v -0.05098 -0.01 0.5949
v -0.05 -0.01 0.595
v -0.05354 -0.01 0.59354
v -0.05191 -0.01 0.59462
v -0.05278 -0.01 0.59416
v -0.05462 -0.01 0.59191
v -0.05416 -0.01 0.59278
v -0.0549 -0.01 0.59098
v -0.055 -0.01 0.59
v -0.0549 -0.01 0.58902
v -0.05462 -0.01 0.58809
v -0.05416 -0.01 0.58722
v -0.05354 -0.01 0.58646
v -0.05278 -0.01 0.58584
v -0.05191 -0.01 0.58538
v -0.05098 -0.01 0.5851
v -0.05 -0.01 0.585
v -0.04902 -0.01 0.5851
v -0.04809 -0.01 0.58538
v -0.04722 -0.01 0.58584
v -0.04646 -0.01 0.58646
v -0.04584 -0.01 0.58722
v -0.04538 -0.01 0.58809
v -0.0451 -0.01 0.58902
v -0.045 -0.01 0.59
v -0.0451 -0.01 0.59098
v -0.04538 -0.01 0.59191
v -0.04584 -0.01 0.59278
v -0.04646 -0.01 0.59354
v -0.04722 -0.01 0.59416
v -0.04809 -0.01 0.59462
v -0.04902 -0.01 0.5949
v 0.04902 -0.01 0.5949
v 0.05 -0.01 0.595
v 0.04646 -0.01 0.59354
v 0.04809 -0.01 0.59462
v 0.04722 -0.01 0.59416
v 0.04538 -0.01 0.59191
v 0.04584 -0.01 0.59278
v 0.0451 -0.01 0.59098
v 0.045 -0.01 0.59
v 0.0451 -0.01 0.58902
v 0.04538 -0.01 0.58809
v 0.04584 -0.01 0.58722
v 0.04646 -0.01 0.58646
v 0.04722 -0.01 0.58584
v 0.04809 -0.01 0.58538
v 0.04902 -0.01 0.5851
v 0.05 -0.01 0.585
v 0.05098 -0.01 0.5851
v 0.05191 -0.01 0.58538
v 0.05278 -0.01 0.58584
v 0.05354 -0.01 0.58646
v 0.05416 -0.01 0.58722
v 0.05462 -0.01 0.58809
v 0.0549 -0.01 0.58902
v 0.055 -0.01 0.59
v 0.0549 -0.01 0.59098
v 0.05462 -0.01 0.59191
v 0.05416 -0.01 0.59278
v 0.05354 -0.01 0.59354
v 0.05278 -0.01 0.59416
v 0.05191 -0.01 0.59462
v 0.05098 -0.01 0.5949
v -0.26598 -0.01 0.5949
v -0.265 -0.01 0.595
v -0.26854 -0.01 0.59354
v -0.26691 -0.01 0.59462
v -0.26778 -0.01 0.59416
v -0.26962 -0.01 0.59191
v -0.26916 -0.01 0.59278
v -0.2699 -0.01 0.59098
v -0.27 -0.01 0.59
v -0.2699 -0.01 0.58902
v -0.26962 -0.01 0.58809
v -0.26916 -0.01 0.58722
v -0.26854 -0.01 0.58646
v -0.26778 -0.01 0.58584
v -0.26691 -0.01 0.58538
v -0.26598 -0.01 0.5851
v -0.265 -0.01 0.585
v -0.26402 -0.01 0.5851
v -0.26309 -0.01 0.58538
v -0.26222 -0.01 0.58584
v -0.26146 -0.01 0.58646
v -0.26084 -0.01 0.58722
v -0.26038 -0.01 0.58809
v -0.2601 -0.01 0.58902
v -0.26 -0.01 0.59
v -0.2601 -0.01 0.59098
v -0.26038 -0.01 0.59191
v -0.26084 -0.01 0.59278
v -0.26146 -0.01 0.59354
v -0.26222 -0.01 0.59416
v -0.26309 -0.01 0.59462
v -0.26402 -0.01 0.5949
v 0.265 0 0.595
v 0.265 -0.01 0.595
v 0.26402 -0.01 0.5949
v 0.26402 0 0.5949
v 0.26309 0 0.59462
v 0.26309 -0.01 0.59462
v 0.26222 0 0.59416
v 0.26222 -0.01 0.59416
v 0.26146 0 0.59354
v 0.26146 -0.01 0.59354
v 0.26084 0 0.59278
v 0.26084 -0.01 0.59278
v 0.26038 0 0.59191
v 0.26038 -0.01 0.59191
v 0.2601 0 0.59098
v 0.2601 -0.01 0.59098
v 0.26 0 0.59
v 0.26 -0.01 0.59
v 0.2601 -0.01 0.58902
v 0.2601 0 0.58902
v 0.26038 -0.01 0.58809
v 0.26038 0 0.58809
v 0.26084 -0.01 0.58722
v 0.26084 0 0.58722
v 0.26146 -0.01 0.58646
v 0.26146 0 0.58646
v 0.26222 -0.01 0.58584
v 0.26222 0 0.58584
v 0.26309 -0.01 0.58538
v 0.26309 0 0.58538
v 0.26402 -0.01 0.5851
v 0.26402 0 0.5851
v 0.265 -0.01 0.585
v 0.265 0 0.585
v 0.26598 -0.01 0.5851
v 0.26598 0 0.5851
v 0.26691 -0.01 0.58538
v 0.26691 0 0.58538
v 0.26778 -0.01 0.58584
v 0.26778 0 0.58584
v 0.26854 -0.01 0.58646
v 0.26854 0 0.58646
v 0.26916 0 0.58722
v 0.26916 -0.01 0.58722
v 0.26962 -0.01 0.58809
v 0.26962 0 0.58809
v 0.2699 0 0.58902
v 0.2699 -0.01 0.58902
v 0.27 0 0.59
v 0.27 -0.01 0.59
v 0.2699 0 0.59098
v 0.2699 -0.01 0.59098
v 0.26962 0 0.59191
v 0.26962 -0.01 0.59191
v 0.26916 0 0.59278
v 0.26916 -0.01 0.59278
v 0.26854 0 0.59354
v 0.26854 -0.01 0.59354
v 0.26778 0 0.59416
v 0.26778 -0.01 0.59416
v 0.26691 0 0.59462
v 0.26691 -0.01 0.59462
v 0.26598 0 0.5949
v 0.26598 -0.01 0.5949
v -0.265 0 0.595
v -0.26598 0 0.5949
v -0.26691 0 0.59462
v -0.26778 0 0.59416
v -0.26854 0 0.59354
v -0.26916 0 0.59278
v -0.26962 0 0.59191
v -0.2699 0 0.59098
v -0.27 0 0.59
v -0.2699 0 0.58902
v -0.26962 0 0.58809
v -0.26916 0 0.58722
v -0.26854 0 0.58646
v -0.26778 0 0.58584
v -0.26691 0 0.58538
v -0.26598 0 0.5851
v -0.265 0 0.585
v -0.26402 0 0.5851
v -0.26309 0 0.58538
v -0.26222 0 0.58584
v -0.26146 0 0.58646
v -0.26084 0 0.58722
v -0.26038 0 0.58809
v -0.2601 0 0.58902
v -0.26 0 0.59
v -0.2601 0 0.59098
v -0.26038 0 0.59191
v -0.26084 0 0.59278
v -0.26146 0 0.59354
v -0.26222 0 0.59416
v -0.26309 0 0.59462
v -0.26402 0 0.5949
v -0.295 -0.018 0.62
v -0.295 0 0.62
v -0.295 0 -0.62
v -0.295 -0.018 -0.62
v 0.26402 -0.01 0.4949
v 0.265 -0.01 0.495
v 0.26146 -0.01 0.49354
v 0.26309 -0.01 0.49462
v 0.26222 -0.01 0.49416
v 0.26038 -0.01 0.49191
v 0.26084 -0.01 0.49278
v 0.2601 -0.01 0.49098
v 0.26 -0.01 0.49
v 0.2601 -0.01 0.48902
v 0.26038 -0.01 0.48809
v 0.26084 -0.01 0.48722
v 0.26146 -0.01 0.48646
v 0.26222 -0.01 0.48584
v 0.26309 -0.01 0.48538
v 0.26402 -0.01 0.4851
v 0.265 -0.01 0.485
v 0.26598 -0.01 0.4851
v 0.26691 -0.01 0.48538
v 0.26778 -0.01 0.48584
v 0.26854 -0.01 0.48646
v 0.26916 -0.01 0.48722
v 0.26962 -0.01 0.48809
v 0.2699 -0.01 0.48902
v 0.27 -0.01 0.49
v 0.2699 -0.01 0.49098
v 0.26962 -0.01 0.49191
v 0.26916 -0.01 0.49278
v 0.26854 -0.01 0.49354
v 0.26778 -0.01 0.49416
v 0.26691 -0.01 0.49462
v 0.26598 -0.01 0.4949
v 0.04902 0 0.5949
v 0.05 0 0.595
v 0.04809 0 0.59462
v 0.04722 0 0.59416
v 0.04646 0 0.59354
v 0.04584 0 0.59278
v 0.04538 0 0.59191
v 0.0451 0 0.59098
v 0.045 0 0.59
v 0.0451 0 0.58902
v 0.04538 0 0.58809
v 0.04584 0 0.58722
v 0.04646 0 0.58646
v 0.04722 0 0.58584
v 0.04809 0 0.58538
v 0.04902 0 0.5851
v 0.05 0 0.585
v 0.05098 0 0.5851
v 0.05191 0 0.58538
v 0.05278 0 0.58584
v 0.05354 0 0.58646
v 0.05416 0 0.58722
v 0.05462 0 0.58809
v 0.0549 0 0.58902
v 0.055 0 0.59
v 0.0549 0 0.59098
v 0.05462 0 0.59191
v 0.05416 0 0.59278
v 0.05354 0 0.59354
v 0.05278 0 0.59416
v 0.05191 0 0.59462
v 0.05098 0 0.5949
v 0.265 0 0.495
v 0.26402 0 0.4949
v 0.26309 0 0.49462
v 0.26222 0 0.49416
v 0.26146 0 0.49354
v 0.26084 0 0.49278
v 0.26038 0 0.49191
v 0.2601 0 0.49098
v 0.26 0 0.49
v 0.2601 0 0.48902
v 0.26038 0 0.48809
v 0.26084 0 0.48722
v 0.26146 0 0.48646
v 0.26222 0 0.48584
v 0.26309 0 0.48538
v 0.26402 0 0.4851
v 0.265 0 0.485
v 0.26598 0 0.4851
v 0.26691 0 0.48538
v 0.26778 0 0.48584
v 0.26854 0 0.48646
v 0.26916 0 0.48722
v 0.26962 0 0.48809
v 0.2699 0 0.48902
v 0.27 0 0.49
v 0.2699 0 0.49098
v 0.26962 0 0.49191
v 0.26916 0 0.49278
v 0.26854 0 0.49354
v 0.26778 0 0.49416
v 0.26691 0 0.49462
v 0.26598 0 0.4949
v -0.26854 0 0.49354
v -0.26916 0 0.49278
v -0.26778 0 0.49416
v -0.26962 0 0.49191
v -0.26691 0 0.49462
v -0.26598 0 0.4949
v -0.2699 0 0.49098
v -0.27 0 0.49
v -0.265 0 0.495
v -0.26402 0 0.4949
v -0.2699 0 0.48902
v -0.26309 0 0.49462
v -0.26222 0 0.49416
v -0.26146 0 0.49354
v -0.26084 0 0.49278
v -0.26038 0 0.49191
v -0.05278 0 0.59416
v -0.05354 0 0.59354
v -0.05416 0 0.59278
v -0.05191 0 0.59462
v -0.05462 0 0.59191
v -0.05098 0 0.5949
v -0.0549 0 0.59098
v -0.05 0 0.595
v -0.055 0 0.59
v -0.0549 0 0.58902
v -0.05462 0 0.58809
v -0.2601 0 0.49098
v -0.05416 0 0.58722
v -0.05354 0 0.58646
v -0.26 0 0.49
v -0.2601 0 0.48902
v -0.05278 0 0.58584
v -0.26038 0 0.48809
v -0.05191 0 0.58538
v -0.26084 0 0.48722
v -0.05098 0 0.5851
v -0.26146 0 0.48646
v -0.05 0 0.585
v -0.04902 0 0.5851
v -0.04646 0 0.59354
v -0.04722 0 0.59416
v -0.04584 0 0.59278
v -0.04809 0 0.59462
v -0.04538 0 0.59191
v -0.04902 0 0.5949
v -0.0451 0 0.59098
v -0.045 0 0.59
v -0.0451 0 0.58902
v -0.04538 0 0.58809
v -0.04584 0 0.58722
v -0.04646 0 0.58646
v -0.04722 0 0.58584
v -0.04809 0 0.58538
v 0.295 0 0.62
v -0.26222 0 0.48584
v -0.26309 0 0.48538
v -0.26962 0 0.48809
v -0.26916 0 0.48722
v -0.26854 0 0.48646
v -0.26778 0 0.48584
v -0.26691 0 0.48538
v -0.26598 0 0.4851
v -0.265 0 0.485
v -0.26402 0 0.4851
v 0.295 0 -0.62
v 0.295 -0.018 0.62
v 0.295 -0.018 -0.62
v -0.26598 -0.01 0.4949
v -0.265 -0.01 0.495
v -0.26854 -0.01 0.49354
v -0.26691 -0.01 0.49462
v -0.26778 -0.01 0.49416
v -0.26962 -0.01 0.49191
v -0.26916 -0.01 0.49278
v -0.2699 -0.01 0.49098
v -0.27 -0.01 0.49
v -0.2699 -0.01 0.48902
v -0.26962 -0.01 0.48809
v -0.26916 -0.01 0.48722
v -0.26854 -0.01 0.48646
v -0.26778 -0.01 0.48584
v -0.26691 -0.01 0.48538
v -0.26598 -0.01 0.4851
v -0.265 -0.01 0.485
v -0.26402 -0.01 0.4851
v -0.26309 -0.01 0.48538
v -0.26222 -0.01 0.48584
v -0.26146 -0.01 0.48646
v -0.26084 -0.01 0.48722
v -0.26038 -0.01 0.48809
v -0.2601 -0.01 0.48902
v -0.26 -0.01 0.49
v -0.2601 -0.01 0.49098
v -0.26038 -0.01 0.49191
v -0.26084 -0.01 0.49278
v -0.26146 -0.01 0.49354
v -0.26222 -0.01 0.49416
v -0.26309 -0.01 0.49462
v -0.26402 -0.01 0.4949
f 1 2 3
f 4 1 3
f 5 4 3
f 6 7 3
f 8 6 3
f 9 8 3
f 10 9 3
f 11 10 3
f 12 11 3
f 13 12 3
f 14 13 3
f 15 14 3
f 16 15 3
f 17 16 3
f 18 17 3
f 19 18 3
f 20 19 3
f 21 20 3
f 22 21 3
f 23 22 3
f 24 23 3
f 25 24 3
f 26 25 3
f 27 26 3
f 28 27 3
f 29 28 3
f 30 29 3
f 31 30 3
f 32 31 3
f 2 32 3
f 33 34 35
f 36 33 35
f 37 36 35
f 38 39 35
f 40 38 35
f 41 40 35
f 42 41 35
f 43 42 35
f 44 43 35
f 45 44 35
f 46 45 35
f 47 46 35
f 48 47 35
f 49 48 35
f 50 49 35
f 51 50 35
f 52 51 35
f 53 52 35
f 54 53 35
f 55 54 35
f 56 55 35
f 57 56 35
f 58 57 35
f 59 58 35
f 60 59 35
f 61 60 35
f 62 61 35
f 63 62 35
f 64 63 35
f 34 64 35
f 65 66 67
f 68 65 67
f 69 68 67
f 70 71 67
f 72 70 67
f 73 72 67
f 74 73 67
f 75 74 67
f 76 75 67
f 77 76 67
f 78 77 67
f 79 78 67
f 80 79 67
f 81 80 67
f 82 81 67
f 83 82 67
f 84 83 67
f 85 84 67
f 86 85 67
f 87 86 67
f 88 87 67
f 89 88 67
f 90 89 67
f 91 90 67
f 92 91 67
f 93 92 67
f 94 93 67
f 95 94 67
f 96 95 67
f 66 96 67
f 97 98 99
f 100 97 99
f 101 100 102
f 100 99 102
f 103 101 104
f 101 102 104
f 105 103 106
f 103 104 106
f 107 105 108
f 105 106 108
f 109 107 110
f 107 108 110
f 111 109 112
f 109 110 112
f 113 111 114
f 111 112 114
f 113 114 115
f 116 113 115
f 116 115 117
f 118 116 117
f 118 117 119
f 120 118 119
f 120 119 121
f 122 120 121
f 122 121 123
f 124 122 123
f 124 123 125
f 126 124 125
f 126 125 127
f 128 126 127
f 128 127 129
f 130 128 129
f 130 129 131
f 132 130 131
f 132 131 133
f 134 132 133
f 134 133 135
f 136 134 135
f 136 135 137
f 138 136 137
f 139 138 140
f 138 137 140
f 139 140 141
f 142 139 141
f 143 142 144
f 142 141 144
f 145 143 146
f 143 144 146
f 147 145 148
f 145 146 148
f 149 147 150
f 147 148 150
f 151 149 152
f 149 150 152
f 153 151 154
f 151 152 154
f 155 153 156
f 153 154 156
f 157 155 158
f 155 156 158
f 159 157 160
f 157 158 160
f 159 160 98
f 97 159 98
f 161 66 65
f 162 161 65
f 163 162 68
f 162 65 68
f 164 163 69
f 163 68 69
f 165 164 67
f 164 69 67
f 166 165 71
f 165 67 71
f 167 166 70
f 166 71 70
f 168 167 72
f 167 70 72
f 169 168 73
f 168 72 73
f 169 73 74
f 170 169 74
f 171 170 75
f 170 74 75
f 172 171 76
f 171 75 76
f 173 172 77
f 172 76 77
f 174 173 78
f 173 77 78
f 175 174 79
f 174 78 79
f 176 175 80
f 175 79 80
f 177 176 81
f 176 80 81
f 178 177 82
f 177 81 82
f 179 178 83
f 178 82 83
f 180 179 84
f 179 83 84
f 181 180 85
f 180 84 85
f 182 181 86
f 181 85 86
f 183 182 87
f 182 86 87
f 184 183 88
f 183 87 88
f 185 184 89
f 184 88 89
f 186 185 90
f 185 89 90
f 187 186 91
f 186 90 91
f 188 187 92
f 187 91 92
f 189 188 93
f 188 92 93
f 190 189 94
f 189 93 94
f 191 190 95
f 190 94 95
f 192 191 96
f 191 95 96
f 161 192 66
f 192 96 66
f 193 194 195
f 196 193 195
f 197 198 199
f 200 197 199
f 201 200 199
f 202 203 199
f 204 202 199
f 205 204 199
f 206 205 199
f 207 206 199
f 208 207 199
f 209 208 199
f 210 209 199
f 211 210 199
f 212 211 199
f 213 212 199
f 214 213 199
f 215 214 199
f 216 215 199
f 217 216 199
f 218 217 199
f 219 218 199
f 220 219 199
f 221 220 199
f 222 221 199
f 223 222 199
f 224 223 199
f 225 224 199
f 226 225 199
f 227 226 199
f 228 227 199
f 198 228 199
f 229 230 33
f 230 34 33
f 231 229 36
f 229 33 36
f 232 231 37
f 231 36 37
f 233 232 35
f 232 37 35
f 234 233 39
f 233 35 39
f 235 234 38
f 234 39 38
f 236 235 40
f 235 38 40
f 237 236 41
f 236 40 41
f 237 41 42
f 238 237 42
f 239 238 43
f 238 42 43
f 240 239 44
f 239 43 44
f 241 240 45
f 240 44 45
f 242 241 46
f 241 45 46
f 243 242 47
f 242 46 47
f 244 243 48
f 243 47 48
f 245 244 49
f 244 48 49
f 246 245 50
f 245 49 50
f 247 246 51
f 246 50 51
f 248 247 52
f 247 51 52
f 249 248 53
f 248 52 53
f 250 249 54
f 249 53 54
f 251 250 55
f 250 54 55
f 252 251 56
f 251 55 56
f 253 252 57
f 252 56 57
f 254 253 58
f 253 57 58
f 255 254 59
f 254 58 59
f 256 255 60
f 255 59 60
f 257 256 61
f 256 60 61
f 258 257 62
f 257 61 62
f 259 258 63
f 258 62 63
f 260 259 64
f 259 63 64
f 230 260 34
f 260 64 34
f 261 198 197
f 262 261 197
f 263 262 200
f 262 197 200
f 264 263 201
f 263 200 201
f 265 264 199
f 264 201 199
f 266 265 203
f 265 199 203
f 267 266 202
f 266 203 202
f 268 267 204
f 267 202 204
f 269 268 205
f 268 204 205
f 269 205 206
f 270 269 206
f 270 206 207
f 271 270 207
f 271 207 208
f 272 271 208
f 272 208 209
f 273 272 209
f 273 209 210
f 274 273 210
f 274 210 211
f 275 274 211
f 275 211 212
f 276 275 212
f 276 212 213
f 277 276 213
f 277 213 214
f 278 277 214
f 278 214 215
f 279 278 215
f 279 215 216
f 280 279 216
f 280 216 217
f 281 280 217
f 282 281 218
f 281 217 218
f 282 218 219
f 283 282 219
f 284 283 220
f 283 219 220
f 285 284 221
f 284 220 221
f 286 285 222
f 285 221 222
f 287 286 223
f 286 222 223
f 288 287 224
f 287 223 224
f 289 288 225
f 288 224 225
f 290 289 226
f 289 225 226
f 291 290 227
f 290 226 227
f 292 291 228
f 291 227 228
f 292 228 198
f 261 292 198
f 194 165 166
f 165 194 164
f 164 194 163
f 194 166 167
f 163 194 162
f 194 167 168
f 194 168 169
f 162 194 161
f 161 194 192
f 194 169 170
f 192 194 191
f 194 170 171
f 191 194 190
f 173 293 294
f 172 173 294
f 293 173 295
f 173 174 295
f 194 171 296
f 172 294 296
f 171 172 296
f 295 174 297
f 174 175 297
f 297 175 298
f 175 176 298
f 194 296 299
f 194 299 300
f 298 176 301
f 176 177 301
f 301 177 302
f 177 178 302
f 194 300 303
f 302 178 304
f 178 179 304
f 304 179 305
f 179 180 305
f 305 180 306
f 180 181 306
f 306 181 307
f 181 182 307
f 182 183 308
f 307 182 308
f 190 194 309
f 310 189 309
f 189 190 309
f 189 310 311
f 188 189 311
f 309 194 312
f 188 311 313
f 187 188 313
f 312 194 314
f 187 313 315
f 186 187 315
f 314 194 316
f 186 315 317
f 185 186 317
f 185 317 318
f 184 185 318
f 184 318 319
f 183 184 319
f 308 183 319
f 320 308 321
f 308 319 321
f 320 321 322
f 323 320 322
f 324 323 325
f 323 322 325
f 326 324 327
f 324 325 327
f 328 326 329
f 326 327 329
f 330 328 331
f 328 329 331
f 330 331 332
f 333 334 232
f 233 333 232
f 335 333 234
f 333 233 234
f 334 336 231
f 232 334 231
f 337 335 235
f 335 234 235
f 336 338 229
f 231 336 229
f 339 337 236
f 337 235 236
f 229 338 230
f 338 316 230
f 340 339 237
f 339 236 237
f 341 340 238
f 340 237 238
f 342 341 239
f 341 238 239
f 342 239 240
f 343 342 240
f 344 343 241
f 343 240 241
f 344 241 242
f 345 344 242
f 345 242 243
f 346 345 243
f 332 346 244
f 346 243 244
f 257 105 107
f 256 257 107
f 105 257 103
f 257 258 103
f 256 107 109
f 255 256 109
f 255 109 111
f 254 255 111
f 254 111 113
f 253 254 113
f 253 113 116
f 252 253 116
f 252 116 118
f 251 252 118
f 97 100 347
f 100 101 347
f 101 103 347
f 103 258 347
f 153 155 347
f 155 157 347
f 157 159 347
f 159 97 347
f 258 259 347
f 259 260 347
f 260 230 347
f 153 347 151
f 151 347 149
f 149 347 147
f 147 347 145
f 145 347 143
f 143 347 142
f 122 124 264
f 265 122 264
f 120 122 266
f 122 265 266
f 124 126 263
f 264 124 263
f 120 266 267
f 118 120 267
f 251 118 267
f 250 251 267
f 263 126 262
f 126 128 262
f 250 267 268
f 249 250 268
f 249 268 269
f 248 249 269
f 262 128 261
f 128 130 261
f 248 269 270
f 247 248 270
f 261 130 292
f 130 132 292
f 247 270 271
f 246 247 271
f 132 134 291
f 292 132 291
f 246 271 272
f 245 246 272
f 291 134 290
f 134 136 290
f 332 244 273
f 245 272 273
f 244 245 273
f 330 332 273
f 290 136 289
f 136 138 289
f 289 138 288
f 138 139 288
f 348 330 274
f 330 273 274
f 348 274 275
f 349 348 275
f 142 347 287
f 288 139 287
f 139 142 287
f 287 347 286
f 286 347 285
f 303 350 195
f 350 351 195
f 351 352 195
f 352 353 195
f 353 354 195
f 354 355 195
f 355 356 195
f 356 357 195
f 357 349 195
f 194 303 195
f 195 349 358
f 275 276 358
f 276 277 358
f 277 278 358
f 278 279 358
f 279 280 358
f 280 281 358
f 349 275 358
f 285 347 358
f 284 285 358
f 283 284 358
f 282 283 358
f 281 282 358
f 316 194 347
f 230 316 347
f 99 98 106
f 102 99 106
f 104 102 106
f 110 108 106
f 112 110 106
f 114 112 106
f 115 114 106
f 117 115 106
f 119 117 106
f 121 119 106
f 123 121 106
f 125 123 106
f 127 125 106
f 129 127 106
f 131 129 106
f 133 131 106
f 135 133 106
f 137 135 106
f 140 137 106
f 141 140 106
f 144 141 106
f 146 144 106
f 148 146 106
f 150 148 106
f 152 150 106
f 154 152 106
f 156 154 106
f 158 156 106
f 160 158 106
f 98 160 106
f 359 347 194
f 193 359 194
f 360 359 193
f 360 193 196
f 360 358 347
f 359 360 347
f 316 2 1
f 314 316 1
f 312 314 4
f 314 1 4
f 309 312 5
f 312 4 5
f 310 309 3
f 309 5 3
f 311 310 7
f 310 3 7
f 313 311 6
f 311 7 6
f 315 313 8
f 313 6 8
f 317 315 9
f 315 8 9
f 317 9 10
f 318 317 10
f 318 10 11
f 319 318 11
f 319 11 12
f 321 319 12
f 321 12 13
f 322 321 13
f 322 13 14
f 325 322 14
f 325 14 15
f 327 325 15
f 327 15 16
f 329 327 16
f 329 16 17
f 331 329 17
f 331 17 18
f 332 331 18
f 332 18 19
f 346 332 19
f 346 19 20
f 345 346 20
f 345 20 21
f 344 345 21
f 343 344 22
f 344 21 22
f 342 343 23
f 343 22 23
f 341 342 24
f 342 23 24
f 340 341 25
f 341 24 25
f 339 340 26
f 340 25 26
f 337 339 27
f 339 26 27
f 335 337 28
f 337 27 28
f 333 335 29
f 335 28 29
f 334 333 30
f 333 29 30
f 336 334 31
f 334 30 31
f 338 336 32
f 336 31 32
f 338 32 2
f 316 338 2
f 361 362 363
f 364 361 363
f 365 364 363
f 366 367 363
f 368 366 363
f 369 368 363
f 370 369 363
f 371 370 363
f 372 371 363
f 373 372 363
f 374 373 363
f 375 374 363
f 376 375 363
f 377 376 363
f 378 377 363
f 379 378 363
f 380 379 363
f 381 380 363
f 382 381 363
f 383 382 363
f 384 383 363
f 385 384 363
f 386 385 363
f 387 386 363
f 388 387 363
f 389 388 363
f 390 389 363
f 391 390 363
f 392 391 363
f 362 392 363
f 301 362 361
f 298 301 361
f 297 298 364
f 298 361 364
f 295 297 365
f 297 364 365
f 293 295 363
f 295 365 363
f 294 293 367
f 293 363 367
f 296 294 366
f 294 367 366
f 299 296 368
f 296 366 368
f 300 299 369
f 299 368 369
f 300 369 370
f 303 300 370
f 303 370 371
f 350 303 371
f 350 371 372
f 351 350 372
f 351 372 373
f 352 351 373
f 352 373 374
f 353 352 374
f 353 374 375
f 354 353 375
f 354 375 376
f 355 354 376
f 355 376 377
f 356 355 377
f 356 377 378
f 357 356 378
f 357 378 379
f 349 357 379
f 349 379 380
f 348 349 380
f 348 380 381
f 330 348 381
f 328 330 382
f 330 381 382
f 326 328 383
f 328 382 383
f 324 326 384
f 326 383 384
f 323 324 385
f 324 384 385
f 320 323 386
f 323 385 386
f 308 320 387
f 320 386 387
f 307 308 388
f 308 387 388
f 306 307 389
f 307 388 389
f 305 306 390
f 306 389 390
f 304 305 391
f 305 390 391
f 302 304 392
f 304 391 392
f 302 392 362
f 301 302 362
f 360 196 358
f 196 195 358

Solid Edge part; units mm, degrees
sketch "Sketch1" plane through (0, 0, 0) normal (0, -1, 0) x (1, 0, 0)
  line L0 (-0.295, -0.62) -> (0.295, -0.62)
  line L1 (0.295, -0.62) -> (0.295, 0.62)
  line L2 (0.295, 0.62) -> (-0.295, 0.62)
  line L3 (-0.295, 0.62) -> (-0.295, -0.62)
  dimension "D1" = 1.24
  dimension "D2" = 0.59
extrude "Protrusion1" add sketch "Sketch1" along normal blind 0.018
hole "Bohrung_1" at (-0.05, 0, 0.59) direction (0, -1, 0) diameter 0.01 depth 0.01
hole "Hole1" at (0.05, 0, 0.59) direction (0, -1, 0) diameter 0.01 depth 0.01
hole "Hole2" at (0.265, 0, 0.59) direction (0, -1, 0) diameter 0.01 depth 0.01
hole "Hole3" at (0.265, 0, 0.49) direction (0, -1, 0) diameter 0.01 depth 0.01
hole "Hole4" at (-0.265, 0, 0.49) direction (0, -1, 0) diameter 0.01 depth 0.01
hole "Hole5" at (-0.265, 0, 0.59) direction (0, -1, 0) diameter 0.01 depth 0.01
